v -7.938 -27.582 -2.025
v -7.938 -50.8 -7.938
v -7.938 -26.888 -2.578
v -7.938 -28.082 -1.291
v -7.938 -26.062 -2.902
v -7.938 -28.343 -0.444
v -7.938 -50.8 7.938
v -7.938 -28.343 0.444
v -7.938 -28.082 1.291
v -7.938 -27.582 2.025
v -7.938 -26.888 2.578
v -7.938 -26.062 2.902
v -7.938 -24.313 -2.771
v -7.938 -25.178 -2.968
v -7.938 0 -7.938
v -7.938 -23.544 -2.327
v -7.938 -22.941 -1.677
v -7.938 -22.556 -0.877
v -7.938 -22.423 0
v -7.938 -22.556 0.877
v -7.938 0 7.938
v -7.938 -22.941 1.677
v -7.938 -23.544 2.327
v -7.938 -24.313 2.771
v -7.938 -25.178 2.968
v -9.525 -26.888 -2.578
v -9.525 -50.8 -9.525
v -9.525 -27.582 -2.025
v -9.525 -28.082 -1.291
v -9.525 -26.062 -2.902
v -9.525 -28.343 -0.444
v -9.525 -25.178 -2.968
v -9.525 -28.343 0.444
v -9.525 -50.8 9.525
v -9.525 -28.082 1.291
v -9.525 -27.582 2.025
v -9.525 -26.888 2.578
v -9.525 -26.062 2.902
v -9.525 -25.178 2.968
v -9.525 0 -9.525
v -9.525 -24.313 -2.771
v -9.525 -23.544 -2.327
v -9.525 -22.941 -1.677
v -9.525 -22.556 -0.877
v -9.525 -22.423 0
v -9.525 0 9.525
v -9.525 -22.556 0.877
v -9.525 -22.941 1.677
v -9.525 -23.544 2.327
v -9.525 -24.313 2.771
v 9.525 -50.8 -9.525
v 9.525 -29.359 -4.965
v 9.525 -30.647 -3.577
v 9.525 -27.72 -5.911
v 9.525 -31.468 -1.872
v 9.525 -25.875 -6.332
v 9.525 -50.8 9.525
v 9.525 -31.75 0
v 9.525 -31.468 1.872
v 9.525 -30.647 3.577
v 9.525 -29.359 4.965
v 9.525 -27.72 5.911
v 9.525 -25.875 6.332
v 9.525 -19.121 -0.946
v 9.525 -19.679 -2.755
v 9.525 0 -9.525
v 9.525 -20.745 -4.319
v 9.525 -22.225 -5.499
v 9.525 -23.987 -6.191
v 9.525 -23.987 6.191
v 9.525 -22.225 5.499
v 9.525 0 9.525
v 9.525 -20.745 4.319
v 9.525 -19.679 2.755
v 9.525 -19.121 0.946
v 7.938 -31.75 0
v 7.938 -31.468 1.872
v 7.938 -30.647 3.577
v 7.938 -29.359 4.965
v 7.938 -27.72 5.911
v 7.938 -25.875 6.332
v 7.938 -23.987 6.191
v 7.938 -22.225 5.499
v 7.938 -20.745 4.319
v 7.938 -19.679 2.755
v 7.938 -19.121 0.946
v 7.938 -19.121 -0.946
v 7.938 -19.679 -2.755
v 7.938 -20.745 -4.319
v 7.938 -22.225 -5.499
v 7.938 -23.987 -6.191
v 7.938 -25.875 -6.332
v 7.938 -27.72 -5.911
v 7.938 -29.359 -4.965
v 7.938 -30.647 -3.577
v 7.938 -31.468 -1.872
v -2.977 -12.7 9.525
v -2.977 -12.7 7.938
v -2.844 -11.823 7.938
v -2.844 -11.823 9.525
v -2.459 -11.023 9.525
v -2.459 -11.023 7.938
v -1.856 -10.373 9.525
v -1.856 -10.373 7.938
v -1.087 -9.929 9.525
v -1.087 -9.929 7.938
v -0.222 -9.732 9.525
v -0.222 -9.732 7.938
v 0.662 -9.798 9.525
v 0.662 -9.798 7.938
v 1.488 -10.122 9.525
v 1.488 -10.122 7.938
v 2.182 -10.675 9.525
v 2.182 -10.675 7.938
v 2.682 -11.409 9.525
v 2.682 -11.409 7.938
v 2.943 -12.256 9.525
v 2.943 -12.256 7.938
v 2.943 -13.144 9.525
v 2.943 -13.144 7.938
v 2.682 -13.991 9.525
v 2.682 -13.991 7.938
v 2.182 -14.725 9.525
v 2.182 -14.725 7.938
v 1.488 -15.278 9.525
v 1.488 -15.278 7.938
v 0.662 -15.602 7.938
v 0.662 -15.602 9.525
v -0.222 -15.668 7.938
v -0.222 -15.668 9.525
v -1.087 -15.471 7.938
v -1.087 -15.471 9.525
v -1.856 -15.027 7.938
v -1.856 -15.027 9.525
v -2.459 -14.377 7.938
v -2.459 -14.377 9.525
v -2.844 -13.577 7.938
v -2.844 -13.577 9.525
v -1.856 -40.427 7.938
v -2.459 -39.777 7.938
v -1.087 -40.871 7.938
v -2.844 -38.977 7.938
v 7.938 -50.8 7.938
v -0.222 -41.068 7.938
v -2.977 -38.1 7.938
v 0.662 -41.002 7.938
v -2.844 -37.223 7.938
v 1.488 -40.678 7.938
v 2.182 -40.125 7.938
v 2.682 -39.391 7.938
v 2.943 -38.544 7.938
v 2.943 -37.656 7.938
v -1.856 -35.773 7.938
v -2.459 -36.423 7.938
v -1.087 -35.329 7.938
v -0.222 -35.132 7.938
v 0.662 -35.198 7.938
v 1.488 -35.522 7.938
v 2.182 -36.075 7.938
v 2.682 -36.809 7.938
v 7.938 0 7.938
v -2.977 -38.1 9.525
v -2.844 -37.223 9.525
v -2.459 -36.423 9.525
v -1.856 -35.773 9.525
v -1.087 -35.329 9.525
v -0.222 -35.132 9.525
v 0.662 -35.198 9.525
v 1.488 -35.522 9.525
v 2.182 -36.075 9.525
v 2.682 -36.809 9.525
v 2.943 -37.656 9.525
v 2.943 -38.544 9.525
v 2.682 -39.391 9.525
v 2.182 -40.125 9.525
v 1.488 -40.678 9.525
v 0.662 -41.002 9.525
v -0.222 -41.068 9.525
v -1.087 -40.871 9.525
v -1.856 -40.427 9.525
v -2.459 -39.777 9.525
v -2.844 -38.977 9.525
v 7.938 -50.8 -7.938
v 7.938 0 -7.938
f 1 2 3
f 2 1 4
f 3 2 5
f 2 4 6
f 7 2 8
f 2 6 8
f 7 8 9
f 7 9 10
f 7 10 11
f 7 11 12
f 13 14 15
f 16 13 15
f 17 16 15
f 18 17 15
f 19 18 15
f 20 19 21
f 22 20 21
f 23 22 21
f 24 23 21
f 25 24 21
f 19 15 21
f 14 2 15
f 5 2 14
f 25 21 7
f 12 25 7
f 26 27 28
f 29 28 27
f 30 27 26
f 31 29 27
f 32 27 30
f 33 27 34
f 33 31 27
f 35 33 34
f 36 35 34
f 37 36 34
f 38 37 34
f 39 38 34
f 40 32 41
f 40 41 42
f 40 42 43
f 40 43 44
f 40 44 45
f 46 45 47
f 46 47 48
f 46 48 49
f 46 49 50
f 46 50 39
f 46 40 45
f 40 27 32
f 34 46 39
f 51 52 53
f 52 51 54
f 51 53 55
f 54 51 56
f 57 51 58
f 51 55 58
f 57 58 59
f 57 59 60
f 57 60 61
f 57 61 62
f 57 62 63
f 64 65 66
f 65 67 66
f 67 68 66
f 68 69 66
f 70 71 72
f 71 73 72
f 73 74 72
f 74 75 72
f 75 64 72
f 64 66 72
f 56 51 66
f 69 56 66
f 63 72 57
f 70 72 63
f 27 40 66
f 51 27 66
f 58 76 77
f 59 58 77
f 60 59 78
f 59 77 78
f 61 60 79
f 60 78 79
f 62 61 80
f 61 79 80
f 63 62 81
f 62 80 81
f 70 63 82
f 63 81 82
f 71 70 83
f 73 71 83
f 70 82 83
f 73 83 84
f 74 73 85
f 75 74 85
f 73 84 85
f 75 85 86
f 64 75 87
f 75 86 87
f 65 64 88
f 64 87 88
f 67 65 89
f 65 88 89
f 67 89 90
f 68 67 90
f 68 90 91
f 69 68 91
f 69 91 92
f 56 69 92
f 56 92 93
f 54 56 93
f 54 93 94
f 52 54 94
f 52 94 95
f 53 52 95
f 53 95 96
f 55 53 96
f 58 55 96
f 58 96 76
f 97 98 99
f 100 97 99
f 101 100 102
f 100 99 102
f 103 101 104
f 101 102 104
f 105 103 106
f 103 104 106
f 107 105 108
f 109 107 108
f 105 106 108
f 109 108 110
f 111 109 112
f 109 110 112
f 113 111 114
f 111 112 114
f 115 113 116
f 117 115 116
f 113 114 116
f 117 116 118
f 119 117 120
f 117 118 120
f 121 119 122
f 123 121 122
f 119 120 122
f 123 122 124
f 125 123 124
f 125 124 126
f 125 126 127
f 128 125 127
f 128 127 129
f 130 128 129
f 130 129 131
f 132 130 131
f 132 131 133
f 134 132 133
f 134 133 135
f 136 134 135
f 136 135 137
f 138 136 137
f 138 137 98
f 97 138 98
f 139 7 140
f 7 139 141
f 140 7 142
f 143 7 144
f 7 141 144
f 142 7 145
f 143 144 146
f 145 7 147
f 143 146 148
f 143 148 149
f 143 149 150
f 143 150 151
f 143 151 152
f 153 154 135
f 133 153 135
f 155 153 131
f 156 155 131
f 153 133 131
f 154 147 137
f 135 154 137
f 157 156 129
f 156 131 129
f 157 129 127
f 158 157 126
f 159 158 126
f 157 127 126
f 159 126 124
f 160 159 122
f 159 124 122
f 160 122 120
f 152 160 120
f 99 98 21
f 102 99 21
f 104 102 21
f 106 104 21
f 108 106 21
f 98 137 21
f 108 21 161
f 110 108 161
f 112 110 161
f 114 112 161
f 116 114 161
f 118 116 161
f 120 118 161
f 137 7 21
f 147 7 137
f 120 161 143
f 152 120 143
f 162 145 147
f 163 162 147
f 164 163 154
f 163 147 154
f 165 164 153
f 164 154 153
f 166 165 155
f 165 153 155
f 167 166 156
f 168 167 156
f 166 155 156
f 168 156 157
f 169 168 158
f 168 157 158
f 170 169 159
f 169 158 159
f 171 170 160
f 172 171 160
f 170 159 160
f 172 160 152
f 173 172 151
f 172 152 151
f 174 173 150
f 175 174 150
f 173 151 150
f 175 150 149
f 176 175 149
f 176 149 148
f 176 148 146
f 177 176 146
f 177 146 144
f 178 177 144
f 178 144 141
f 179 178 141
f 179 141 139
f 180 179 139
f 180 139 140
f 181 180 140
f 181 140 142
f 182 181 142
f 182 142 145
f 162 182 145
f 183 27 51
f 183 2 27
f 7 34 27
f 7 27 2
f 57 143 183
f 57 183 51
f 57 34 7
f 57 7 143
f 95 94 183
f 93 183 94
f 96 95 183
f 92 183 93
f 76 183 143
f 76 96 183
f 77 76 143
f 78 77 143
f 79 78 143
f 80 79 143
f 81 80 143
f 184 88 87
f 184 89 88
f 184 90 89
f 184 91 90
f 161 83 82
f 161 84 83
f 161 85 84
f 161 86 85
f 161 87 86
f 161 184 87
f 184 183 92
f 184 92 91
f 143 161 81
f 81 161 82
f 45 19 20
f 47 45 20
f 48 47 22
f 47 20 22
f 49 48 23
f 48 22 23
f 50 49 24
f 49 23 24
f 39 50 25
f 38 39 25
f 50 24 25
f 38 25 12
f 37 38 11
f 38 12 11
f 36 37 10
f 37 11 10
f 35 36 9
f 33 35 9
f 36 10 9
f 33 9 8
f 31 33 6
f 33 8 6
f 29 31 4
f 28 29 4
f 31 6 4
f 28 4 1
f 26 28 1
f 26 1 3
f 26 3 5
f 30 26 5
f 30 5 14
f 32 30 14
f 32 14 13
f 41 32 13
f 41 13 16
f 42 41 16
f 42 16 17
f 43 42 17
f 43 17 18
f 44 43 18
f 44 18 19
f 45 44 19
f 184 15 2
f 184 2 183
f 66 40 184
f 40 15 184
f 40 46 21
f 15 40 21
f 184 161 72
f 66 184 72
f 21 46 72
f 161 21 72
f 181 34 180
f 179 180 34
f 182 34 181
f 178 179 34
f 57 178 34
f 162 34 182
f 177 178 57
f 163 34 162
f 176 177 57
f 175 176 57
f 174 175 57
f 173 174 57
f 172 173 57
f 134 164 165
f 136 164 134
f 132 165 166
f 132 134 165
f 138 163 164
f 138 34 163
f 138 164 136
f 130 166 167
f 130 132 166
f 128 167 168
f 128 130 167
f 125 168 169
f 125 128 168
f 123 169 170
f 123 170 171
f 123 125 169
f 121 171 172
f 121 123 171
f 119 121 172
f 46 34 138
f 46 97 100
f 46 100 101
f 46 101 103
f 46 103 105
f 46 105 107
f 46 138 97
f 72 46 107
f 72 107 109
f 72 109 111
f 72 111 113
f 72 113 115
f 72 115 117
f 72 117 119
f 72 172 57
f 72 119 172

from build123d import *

# Parameters (mm, degrees)
F0_W     = 19.05
F0_H     = 19.05
F0_W_2   = 15.875
F0_H_2   = 15.875
F1_DEPTH = 50.8
F3_D     = 5.953125
F3_DEPTH = 6.35
F5_D     = 12.7
F5_DEPTH = 6.35
F7_D     = 5.953125
F7_DEPTH = 6.35


with BuildPart() as f1:
    # F0 (on Front) → F1 (new body)
    with BuildSketch(Plane.XZ):
        Rectangle(F0_W, F0_H)
        Rectangle(F0_W_2, F0_H_2, mode=Mode.SUBTRACT)
    extrude(amount=F1_DEPTH)

    # F3
    with Locations(Plane(origin=(-9.525, 0, 0), x_dir=(0, -1, 0), z_dir=(-1, 0, 0))):
        with Locations((25.4, 0)):
            Hole(F3_D / 2, depth=F3_DEPTH)

    # F5
    with Locations(Plane.YZ.offset(9.525)):
        with Locations((-25.4, 0)):
            Hole(F5_D / 2, depth=F5_DEPTH)

    # F7
    with Locations(Plane.XY.offset(9.525)):
        with Locations((0, -12.7), (0, -38.1)):
            Hole(F7_D / 2, depth=F7_DEPTH)


solid = f1.part
